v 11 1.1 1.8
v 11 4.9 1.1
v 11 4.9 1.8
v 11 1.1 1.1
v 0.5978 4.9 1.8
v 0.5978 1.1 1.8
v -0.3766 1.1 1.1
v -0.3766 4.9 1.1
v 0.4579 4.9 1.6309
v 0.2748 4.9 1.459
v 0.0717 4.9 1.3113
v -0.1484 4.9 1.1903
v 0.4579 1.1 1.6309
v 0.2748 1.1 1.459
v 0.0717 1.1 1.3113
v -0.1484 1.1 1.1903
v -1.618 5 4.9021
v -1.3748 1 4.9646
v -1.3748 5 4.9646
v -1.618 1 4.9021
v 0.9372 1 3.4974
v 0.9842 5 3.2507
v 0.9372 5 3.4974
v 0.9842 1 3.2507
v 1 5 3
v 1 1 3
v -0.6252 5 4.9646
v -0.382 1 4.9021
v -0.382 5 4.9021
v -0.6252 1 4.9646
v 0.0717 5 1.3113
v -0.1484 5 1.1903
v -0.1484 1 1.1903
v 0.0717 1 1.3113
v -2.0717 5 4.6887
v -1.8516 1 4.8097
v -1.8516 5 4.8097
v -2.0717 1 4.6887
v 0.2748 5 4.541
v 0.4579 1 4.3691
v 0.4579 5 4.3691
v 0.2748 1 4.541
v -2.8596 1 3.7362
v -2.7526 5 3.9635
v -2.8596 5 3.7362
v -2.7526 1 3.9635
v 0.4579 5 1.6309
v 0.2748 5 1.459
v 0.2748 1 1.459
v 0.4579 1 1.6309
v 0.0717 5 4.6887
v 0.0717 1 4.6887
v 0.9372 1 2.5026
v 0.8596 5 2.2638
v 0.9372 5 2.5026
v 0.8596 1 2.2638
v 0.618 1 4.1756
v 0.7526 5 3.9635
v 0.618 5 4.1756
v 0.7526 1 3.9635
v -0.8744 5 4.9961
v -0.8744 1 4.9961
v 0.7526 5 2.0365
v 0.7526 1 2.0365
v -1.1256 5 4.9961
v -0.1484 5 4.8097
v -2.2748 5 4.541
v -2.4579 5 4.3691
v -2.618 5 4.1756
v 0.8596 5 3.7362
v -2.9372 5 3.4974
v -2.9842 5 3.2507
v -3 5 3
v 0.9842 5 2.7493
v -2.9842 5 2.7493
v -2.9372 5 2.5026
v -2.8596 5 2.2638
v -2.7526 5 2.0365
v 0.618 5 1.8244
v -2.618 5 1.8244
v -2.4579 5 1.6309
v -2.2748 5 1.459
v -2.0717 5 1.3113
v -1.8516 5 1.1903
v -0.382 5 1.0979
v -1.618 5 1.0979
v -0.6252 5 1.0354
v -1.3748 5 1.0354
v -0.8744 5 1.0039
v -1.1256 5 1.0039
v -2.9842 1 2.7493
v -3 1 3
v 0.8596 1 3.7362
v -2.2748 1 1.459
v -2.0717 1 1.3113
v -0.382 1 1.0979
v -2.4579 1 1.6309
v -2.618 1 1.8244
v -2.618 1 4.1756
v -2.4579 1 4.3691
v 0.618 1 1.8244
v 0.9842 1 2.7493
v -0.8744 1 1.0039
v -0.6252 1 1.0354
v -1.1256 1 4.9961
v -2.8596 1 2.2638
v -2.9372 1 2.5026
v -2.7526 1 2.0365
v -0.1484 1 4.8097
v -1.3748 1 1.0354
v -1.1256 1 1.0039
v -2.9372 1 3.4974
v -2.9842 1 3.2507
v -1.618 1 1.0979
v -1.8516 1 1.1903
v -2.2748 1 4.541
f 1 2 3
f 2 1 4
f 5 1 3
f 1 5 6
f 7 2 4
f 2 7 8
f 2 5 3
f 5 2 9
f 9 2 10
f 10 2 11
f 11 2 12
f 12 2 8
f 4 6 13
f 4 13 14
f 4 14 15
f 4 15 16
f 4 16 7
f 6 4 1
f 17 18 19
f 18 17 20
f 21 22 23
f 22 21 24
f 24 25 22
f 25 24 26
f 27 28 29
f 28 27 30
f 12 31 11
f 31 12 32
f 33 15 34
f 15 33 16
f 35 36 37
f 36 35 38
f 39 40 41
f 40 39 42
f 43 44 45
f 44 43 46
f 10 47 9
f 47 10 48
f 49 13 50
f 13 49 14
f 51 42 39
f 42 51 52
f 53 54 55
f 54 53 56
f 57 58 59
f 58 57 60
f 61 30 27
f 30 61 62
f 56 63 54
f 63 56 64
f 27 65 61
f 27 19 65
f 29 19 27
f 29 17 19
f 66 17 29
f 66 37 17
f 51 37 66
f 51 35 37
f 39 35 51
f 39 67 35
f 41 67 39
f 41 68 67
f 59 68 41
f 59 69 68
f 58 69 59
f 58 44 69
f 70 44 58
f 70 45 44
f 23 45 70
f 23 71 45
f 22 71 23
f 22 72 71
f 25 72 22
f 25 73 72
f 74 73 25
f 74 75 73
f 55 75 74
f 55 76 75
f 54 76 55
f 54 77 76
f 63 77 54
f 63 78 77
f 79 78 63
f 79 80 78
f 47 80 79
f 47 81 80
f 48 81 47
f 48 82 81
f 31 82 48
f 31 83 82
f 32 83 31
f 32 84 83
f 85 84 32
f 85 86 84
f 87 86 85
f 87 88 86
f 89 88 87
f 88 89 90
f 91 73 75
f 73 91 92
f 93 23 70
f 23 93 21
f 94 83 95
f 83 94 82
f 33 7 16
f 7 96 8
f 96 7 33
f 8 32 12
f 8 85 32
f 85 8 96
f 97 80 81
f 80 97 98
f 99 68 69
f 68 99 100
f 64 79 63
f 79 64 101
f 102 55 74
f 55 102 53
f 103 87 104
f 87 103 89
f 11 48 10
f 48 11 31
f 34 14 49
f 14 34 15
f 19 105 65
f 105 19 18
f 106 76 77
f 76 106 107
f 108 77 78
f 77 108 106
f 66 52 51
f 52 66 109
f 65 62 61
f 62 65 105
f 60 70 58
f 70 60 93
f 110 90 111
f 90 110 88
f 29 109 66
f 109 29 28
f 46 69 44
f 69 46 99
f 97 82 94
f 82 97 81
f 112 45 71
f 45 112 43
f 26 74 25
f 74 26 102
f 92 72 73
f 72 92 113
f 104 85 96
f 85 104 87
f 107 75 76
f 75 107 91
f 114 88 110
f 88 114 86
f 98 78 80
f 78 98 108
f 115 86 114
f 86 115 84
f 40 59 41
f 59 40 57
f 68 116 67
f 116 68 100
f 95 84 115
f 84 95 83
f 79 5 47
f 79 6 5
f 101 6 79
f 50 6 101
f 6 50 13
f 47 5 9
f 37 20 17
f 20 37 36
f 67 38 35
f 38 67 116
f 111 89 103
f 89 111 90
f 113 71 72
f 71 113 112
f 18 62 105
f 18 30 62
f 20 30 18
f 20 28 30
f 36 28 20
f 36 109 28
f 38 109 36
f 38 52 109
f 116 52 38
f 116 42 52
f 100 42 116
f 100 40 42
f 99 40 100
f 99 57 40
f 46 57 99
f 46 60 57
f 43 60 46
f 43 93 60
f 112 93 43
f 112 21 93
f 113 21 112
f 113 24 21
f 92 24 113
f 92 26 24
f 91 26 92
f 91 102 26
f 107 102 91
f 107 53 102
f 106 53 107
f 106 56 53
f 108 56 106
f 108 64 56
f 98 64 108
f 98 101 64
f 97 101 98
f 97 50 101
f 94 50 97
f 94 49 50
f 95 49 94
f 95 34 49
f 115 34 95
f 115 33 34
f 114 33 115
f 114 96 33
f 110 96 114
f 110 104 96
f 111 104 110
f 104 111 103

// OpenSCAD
// file: pulley.scad
module outer_box(){
 	cube([6, 6, 0.5]);
 
	//right wall
 	translate([0, 0, .5])
 		cube([6, 0.5, 2.5]);
 	//left wall
 	translate([0, 5.5, .5])
 		cube([6, 0.5, 2.5]);

	//cover
 	translate([2, .5, 2])
 		cube([1, 5, 0.5]);
 }
 
 module inner_slide(){
 	color("blue")
 		translate([-1, 1.1, 1.1]){
 			cube([12, 3.8, 0.7]);
 			cube([1, 3.8, 2]);
 	}
 }
 
module pulley(){
 % outer_box();
 inner_slide();
}

scale([3, 3, 3])
	pulley();

//base
cube([50, 80, 1]);

translate([0, 0, 10]) rotate([-90, 0, 0])
difference(){
	cylinder(h=18, $fn=100, r=5);
	translate([-5, 0, -5]) cube([12, 10, 25]);
}
// main file
use <pulley.scad>;
 %outer_box();
 inner_slide();
 
 translate([-1,5,3])
 rotate([90,0,0])
 cylinder(r=2, h=4, $fn=50);
